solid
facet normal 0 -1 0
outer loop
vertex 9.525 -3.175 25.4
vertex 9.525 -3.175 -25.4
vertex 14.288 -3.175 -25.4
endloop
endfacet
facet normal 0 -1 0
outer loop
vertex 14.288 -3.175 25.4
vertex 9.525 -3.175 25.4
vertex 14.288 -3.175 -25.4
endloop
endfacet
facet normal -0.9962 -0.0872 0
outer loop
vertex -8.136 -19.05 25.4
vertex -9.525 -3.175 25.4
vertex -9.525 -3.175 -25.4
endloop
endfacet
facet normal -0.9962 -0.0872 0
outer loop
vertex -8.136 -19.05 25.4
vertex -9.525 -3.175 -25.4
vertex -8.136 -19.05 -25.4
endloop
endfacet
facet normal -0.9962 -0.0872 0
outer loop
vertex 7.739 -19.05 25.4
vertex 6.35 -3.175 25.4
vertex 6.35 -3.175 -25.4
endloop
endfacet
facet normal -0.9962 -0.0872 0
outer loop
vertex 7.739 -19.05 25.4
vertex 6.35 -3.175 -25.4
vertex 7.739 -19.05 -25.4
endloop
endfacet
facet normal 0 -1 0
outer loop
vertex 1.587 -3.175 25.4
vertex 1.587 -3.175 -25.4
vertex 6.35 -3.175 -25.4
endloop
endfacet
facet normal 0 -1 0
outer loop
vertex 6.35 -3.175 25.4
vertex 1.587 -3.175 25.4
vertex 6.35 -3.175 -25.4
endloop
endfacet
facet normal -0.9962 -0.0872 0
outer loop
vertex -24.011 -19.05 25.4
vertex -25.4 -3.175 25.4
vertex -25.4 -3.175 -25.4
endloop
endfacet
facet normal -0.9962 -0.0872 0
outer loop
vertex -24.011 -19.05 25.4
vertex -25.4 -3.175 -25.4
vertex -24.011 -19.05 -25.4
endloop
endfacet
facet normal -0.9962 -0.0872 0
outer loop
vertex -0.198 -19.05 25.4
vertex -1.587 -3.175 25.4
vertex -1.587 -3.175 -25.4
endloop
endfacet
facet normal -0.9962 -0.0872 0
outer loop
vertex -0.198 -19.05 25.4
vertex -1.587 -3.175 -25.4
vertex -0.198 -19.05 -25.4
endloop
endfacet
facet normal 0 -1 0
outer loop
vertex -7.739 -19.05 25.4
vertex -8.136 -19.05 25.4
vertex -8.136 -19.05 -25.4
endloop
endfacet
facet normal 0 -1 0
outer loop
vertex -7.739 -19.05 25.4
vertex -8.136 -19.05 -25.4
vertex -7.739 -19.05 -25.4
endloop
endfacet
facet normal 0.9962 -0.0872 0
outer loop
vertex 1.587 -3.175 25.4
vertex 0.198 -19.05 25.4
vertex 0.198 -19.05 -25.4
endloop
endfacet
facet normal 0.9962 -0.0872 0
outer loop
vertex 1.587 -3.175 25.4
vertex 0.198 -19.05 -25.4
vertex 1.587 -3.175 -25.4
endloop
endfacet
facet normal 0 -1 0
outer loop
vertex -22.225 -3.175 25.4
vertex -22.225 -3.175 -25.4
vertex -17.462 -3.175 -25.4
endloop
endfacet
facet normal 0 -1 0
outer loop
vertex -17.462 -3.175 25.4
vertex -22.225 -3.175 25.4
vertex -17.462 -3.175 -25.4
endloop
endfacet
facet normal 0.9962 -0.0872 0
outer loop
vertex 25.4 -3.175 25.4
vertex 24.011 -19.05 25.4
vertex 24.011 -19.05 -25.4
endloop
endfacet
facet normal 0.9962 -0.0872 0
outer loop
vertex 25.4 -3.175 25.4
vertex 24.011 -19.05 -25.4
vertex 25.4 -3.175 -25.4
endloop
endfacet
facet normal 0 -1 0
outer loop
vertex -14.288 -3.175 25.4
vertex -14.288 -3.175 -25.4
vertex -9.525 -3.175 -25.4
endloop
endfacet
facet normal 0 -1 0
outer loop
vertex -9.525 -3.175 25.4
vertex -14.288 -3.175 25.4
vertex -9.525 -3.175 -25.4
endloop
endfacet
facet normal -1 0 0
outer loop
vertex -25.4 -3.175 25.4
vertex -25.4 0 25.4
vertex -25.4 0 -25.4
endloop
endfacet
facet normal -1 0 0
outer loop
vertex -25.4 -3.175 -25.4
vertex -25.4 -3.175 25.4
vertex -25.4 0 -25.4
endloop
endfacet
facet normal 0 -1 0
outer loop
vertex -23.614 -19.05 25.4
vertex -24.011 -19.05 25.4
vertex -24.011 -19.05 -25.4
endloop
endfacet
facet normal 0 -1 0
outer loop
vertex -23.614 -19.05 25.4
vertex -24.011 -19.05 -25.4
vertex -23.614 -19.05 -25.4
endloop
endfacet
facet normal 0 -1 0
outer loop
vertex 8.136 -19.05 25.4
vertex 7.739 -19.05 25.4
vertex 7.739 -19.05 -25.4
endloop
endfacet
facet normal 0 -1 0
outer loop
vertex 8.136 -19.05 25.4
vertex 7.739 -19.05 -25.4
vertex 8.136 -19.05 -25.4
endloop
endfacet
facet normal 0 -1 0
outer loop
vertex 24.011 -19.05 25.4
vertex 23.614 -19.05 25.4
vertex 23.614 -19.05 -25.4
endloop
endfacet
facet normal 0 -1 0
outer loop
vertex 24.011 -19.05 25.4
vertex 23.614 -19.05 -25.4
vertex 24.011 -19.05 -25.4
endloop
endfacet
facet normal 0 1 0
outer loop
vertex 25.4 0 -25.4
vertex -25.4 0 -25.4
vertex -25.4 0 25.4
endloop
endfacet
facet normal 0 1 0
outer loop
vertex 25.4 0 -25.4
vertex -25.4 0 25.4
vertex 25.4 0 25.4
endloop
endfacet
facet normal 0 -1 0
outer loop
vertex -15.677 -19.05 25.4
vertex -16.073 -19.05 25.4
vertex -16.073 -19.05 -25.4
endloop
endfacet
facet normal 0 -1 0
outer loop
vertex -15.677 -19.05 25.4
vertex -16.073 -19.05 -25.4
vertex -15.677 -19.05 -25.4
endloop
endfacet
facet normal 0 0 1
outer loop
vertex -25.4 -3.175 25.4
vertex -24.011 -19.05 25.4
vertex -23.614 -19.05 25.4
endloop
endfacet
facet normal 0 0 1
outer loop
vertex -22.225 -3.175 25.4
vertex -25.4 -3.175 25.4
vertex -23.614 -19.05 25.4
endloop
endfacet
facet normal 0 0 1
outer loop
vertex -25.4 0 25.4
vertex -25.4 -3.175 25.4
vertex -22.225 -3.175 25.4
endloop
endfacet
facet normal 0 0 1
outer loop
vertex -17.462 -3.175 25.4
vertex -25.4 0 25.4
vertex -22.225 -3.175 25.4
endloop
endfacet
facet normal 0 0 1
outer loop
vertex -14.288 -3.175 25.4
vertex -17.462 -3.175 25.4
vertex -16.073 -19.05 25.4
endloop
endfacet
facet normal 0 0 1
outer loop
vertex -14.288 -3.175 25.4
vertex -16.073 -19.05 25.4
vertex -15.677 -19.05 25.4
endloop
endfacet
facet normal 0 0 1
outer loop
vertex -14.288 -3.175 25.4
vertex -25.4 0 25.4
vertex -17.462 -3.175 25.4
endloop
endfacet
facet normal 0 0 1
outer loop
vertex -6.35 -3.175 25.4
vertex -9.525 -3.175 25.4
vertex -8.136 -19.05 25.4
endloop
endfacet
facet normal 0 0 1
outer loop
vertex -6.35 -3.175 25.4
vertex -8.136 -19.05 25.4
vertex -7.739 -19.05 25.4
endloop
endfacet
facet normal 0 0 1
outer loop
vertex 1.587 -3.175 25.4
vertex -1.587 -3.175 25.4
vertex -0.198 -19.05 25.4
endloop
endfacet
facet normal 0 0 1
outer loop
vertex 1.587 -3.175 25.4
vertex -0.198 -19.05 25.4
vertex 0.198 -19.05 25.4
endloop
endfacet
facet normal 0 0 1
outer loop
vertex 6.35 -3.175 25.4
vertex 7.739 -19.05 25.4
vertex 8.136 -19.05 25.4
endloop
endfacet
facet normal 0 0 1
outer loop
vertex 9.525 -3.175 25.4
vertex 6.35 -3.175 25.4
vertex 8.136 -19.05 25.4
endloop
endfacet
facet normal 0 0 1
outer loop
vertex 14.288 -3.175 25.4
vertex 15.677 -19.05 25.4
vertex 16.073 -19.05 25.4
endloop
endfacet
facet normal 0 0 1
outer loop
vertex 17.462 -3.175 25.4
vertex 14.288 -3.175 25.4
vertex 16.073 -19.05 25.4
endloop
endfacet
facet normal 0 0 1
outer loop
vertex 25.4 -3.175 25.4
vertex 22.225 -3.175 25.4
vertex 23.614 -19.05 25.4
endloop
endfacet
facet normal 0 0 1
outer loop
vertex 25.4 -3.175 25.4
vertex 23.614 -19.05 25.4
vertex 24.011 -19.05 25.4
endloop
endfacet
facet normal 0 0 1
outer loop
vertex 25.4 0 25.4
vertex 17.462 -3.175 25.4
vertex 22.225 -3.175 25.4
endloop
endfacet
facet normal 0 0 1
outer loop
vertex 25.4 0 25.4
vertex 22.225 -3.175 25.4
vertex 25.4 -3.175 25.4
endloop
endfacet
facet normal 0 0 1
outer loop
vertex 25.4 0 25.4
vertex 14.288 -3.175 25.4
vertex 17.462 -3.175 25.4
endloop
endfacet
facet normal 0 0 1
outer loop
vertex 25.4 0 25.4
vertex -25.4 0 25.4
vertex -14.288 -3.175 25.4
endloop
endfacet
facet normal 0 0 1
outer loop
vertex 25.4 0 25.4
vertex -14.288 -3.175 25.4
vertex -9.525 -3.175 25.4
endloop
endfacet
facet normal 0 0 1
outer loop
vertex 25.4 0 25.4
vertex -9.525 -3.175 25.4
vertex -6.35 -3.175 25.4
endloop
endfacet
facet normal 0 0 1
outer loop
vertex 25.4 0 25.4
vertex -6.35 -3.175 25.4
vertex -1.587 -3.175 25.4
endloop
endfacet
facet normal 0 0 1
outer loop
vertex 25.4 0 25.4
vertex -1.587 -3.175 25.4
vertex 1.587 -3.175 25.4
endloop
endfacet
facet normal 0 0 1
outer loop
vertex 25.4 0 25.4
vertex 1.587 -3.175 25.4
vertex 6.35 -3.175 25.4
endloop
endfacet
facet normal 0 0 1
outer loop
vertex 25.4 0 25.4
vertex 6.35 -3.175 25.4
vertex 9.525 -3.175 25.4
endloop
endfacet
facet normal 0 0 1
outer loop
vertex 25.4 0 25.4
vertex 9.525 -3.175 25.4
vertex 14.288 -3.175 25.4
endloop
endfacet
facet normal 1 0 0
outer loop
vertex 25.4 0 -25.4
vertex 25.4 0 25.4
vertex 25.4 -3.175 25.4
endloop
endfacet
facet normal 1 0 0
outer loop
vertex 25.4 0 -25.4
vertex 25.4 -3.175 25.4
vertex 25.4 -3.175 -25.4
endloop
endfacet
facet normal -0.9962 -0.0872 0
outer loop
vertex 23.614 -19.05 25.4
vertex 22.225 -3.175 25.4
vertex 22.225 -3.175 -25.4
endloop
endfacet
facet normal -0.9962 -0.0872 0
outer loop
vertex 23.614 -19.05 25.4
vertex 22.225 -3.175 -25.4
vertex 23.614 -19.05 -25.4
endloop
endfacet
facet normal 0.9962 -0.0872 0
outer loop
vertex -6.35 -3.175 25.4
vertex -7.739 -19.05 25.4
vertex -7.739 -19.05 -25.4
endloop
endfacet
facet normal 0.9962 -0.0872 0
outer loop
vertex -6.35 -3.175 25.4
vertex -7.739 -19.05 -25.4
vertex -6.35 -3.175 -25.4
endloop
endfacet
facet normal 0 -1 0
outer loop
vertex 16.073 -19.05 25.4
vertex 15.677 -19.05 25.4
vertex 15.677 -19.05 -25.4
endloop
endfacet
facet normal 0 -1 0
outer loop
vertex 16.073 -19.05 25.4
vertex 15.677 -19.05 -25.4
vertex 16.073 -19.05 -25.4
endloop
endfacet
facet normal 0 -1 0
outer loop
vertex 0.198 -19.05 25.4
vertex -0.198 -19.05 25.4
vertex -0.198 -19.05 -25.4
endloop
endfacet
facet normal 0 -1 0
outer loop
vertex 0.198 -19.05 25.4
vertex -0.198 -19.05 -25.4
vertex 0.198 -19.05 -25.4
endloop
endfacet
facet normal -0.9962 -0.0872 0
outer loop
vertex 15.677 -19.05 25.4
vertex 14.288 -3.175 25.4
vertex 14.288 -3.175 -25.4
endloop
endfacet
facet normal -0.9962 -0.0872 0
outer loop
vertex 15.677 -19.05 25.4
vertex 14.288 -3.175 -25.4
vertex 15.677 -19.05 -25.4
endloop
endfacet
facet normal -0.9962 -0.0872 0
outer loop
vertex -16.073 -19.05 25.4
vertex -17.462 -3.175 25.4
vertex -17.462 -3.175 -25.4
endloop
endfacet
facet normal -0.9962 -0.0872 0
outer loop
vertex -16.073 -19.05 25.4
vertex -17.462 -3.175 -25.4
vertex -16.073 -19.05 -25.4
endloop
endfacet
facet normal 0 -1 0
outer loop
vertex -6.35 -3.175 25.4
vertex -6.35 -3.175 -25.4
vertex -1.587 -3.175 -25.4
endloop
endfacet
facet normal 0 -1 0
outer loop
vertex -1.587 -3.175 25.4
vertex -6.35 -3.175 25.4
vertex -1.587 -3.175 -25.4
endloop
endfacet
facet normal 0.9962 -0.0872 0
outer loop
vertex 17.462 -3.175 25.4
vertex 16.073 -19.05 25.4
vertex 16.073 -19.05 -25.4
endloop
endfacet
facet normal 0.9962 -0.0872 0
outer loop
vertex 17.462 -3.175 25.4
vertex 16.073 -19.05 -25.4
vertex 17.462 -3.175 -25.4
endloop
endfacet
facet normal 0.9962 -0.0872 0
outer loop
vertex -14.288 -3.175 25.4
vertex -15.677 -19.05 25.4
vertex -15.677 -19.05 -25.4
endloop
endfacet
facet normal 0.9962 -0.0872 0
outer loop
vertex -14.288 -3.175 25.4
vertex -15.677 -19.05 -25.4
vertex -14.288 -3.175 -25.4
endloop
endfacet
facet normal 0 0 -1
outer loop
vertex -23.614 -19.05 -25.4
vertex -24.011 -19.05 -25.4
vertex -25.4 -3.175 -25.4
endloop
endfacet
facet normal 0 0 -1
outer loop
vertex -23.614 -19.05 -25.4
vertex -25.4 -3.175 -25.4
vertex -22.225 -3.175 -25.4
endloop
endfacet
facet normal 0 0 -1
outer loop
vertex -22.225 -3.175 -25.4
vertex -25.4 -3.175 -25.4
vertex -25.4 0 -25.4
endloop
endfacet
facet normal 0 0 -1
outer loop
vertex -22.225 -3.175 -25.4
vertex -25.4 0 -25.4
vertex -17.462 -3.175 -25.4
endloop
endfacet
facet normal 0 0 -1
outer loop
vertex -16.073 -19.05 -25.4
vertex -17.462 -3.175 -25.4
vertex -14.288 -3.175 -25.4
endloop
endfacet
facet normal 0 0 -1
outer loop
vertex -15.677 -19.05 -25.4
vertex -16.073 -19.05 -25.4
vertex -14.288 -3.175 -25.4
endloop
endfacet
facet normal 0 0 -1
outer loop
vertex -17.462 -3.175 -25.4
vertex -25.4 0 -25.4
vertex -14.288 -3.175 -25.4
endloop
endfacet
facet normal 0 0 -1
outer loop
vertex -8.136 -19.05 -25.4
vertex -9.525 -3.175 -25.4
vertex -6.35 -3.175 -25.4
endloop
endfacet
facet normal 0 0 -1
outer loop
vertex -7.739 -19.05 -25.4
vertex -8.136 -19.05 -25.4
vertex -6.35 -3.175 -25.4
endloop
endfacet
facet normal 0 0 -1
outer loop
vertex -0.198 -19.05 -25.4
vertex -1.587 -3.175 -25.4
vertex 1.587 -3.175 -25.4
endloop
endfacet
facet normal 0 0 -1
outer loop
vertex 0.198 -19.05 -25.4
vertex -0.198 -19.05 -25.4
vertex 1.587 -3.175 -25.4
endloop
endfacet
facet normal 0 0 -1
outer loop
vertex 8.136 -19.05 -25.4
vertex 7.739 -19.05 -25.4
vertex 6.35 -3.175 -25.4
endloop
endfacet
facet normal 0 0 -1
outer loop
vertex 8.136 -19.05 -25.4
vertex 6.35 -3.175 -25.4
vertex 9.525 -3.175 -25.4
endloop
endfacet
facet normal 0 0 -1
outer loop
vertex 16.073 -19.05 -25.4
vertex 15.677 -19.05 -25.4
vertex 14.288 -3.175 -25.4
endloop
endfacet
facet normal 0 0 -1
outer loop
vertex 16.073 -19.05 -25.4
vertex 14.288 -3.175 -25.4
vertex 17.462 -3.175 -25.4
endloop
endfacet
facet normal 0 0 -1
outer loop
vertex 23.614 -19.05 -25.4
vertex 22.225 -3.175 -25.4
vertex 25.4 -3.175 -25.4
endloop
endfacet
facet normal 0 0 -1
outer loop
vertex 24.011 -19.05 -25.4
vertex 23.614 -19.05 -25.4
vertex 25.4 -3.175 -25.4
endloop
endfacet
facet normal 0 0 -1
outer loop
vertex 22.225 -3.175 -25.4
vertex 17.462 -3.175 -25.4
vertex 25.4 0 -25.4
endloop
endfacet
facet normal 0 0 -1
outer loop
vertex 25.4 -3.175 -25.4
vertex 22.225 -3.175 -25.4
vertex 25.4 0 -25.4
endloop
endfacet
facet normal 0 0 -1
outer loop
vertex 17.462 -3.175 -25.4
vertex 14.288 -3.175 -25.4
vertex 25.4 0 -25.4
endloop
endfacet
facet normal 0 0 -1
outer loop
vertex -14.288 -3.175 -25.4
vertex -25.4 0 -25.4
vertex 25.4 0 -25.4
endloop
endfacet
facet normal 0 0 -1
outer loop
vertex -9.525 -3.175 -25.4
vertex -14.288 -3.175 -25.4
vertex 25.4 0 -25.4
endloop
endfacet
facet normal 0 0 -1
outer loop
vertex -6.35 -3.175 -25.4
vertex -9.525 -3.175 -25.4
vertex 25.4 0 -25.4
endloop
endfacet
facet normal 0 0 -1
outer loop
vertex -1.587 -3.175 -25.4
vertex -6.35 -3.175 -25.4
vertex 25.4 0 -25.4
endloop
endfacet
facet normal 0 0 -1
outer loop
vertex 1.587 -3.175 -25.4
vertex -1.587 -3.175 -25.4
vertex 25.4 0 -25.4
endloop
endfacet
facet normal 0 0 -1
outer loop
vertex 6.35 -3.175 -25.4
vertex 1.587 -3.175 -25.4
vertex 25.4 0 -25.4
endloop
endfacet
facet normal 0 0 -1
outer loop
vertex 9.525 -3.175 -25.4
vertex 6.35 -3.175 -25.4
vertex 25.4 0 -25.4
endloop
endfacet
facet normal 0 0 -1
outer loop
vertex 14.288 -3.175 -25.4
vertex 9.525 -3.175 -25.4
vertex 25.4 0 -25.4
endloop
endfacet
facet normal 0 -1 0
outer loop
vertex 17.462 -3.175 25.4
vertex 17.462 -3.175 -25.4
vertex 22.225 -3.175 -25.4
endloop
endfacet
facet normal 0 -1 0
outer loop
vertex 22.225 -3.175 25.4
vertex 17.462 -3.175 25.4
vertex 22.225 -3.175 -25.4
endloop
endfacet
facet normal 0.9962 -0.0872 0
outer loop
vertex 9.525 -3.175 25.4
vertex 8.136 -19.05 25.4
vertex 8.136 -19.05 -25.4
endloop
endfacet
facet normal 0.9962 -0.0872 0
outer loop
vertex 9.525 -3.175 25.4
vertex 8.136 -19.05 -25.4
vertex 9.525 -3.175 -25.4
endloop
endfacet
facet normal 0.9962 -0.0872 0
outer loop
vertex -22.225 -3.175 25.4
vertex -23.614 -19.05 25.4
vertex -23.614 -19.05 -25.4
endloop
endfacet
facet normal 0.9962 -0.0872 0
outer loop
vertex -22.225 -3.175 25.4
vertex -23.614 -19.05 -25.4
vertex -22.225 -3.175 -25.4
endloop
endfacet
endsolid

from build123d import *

# Parameters (mm, degrees)
SKETCH1_W           = 50.8
SKETCH1_H           = 50.8
BOSS_EXTRUDE1_DEPTH = 3.175
BOSS_EXTRUDE2_DEPTH = 50.8
LPATTERN1_COUNT     = 7
LPATTERN1_PITCH     = 7.9375


with BuildPart() as part:
    # Sketch1 → Boss-Extrude1 (new body)
    with BuildSketch(Plane(origin=(0, 0, 0), x_dir=(1, 0, 0), z_dir=(0, 1, 0))):
        Rectangle(SKETCH1_W, SKETCH1_H)
    extrude(amount=-BOSS_EXTRUDE1_DEPTH)

    # Sketch2 → Boss-Extrude2 (add, through all)
    with BuildSketch(Plane.XY.offset(25.4)):
        Polygon((-25.4, -3.175), (-24.01062, -19.05), (-23.61438, -19.05), (-22.225, -3.175), align=None)
    boss_extrude2 = extrude(amount=-BOSS_EXTRUDE2_DEPTH)

    # LPattern1: Boss-Extrude2 ×7
    with Locations(*[(i * LPATTERN1_PITCH, 0, 0) for i in range(1, LPATTERN1_COUNT)]):
        add(boss_extrude2)


solid = part.part
